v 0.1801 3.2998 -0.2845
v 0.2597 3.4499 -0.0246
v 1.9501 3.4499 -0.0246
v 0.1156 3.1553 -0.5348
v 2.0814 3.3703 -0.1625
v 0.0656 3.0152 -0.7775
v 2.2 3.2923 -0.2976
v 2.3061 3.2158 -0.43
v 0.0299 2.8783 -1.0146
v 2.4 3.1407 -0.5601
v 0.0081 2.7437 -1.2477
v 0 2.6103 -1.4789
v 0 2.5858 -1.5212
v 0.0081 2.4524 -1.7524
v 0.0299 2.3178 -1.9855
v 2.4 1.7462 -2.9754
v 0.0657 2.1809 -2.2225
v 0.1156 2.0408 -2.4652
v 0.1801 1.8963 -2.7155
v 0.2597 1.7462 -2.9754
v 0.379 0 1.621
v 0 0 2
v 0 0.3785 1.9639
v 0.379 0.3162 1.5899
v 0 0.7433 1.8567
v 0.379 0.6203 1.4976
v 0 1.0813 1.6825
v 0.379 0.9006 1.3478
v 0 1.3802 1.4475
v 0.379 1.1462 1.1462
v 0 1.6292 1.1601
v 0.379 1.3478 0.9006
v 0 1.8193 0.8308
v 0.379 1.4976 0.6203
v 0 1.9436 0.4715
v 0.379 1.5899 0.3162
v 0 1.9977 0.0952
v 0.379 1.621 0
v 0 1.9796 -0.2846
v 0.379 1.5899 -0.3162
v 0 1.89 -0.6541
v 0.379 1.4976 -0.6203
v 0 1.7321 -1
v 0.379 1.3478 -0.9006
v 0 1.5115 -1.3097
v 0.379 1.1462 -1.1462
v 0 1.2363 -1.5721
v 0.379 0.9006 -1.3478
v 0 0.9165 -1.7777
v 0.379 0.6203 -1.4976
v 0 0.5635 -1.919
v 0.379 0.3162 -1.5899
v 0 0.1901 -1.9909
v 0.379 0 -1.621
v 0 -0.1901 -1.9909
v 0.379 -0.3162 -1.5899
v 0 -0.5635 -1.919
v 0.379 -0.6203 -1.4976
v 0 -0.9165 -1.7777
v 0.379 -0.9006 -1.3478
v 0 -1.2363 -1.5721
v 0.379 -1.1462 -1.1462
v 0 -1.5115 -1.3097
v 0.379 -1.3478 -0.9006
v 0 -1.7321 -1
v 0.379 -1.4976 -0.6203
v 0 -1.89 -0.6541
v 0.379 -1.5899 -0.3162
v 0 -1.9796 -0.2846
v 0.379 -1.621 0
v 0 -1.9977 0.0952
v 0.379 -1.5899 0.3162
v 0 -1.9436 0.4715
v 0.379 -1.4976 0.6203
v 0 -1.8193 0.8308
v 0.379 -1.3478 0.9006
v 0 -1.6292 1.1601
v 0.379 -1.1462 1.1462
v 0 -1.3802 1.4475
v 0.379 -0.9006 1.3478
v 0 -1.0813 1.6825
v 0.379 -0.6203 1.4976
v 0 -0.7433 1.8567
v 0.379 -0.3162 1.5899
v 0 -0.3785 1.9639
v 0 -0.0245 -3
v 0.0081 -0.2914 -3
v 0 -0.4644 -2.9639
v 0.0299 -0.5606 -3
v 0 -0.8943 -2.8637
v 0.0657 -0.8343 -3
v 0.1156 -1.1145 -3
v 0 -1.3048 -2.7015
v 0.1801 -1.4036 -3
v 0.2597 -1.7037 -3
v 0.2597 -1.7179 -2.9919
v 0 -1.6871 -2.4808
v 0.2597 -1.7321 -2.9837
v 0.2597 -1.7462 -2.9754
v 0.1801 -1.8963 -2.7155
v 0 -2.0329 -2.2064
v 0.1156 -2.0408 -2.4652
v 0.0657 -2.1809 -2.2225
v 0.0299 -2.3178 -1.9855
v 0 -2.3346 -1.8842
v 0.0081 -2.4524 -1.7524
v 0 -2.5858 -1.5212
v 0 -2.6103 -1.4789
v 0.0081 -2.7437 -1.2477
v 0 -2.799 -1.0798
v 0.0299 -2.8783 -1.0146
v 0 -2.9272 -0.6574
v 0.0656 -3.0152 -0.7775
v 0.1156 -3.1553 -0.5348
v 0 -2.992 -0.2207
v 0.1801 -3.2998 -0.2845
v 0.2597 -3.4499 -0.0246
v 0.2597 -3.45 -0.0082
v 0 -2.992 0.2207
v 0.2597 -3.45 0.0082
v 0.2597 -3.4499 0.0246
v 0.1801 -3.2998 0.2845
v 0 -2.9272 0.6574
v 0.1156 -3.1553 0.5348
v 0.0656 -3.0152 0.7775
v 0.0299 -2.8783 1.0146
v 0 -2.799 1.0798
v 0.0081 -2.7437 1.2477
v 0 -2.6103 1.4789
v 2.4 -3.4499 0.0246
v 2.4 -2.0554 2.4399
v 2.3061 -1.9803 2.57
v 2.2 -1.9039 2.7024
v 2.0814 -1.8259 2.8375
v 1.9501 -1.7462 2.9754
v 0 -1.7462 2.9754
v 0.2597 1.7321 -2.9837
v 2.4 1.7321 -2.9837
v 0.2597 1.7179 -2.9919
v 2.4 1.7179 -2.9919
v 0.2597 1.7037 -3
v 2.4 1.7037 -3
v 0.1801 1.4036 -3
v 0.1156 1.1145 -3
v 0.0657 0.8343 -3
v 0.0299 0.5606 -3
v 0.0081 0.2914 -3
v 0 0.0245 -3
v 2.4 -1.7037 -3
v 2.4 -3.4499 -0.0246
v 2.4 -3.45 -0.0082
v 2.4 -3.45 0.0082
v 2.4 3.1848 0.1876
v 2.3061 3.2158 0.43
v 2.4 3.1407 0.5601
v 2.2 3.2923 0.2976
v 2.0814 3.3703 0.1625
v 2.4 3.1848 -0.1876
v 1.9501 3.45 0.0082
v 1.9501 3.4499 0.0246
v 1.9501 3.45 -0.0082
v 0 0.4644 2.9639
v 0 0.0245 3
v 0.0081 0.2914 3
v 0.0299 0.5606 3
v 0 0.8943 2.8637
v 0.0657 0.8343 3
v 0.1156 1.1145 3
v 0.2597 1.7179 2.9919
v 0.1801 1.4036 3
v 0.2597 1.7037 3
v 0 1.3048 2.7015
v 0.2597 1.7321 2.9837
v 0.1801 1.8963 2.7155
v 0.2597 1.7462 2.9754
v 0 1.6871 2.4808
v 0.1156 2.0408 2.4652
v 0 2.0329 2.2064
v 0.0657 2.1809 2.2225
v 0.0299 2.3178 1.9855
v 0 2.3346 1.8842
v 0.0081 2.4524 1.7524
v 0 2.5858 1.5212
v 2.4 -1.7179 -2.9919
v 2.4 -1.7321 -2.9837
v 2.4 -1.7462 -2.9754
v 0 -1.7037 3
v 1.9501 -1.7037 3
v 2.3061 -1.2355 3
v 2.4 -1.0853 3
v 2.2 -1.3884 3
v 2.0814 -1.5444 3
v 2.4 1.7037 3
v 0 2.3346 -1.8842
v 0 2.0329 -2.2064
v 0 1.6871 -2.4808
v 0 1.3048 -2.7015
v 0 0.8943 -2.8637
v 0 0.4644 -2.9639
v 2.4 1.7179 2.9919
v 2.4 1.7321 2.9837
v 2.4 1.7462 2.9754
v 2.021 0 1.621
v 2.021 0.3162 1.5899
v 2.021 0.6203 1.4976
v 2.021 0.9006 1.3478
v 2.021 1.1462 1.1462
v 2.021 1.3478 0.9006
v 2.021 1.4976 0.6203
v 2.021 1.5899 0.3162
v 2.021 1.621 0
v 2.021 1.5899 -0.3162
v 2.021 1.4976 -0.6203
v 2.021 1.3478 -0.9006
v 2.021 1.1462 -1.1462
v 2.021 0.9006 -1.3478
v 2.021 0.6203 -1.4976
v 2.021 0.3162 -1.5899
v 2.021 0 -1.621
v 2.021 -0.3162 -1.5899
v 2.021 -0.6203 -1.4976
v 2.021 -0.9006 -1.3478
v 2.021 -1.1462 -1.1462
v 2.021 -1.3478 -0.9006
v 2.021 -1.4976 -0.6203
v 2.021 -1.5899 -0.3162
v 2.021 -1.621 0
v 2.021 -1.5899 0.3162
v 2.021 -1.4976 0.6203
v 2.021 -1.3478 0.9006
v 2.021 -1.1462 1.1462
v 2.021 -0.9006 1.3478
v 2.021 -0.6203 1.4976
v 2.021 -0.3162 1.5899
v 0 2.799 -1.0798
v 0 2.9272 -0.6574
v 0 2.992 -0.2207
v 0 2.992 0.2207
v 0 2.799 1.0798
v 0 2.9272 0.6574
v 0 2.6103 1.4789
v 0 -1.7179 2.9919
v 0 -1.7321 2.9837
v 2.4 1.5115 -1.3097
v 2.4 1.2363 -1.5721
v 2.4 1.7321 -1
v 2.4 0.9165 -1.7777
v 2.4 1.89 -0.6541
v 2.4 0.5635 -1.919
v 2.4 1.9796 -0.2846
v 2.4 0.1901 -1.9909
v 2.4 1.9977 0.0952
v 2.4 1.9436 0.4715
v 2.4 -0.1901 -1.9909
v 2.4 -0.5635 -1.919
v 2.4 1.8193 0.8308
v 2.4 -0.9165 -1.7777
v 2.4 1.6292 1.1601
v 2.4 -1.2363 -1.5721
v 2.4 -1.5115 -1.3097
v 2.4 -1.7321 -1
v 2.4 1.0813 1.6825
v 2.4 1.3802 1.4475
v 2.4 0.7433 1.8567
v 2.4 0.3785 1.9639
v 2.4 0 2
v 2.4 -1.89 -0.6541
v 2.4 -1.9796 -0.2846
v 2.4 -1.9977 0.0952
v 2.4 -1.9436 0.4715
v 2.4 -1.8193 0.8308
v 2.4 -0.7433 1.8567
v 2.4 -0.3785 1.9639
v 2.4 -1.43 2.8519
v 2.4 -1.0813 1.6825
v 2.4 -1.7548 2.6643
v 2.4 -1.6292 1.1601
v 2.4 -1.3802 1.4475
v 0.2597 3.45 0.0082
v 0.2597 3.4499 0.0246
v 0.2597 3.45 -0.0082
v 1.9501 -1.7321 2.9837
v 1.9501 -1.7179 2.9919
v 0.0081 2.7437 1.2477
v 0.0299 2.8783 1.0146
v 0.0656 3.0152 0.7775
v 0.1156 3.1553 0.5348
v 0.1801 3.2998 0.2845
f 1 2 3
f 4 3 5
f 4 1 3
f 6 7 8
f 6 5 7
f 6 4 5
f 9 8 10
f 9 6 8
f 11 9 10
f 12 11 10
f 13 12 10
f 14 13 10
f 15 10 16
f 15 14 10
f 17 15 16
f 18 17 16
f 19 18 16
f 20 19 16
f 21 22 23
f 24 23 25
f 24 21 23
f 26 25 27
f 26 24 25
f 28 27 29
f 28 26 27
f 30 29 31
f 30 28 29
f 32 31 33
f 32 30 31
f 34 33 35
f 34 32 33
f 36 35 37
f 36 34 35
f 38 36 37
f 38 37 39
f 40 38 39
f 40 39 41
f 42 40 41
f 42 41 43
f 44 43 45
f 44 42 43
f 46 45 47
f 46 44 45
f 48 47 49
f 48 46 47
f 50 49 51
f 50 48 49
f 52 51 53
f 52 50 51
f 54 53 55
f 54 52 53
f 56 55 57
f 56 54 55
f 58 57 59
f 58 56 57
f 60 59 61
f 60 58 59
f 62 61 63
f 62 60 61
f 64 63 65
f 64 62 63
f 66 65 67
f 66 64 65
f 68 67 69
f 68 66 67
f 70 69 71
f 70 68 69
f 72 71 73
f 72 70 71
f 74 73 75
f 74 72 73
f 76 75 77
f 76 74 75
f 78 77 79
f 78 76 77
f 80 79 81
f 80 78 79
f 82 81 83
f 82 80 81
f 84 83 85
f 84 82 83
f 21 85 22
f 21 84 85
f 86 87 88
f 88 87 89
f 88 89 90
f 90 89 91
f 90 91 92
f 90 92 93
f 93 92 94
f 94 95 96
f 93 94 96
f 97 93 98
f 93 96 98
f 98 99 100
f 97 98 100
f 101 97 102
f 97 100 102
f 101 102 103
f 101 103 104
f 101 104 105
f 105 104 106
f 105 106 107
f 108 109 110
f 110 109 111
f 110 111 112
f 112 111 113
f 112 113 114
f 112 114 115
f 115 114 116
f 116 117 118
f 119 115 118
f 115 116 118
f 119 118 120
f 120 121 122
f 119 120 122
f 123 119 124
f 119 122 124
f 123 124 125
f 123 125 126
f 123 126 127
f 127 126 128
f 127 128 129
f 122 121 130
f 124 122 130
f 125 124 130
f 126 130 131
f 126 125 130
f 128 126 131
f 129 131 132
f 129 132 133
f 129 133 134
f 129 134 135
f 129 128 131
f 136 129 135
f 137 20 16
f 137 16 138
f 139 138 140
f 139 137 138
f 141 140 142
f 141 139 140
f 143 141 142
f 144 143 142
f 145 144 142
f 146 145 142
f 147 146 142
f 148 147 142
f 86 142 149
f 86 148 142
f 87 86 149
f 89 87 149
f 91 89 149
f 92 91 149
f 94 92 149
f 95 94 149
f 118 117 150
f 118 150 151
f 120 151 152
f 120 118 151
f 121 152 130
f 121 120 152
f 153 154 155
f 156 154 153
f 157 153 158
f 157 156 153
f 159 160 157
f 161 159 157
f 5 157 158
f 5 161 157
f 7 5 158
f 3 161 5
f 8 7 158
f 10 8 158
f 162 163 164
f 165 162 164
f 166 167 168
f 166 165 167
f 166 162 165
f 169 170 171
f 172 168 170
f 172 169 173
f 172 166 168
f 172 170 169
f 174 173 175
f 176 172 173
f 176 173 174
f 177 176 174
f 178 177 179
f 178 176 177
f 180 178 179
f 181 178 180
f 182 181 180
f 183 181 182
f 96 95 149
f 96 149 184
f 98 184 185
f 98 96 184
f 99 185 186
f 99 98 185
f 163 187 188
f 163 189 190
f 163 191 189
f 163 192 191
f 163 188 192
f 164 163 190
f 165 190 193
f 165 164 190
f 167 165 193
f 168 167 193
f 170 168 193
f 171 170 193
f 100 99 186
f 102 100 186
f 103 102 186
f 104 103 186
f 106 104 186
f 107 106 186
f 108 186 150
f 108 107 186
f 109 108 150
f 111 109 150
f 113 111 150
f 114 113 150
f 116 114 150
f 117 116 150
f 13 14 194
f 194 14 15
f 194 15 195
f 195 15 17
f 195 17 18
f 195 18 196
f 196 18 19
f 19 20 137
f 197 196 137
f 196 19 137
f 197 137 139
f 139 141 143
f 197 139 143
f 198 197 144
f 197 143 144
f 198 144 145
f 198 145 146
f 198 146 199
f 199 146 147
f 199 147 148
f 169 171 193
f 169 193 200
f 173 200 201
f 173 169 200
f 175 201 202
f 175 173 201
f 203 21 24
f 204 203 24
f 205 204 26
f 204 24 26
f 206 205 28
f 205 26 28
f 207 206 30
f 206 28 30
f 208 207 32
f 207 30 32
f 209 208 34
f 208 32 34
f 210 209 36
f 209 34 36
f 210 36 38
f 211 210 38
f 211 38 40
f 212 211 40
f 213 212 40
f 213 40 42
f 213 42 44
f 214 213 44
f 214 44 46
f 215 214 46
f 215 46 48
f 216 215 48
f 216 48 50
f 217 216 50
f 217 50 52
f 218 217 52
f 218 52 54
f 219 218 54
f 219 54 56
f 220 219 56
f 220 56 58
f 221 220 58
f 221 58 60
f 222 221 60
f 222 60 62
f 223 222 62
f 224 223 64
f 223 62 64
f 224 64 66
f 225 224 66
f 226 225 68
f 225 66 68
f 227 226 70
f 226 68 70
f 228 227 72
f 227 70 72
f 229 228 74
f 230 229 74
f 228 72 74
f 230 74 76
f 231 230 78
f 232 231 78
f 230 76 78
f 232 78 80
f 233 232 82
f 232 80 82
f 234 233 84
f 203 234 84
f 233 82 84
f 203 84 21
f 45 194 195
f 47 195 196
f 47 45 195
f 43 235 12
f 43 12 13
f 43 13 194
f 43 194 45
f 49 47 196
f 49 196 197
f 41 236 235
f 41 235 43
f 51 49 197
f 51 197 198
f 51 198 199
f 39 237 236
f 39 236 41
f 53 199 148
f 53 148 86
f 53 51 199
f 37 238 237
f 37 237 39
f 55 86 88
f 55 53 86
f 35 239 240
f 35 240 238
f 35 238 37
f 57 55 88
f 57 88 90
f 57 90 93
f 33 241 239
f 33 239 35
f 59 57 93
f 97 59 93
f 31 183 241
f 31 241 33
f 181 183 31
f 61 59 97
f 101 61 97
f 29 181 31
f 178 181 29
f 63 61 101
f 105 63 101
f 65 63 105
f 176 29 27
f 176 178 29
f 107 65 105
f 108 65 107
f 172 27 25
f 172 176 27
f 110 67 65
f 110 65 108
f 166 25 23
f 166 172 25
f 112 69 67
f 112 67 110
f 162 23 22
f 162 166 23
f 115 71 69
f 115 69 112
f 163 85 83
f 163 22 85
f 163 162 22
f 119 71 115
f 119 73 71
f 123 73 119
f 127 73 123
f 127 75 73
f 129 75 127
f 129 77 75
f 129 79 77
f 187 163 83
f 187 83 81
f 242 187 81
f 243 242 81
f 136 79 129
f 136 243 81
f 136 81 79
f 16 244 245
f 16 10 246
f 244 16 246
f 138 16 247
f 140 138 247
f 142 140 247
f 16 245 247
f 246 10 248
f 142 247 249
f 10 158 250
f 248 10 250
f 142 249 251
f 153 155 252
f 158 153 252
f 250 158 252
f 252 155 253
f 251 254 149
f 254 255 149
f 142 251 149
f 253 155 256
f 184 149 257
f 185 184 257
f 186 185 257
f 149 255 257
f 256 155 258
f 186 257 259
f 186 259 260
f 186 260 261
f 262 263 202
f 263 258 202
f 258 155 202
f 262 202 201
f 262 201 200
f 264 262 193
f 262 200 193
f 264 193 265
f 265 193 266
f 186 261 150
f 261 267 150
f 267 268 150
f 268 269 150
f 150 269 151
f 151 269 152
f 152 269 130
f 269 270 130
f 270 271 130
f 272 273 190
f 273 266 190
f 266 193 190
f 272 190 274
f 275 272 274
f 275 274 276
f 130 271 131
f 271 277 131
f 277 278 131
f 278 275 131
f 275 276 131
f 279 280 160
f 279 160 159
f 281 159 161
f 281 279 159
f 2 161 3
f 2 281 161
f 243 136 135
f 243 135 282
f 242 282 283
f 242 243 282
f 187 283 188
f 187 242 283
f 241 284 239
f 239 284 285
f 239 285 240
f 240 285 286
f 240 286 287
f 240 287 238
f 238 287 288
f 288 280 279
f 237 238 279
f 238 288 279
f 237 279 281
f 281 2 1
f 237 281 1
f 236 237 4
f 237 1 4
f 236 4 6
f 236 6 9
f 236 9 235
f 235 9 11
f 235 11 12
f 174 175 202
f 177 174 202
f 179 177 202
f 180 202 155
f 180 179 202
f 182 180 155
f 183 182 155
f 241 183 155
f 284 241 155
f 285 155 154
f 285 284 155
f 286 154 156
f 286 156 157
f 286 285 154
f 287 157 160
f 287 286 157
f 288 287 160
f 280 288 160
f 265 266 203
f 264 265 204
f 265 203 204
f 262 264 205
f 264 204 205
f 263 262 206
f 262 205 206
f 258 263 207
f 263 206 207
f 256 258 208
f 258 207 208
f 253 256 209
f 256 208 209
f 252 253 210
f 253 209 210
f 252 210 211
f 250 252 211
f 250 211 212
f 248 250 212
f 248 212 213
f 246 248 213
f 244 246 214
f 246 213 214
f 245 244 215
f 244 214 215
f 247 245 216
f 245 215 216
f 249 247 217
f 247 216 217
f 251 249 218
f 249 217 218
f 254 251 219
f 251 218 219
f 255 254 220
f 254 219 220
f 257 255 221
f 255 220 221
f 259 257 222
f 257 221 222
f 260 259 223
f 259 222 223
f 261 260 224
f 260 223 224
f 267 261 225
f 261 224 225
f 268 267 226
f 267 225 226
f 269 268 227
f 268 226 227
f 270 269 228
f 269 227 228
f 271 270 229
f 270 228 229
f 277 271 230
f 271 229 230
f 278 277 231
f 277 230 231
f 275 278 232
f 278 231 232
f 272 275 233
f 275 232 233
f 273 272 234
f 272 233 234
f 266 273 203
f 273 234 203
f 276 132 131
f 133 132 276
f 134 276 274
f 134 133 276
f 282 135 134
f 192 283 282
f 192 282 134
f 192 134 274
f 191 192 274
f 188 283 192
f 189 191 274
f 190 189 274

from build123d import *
from OCP.BRepFilletAPI import BRepFilletAPI_MakeChamfer

# Parameters (mm, degrees)
EXTRUDE_1_DEPTH    = 2.4
HOLE_WIZARD_M3_1_D = 3.242
CHAMFER_1_SIZE     = 0.45
CHAMFER_1_SIZE_2   = 0.259807621
CHAMFER_3_SIZE     = 0.379


with BuildPart() as part:
    # 草圖1 → 填料-伸長1 (new body)
    with BuildSketch(Plane(origin=(0, 0, 0), x_dir=(0, -1, 0), z_dir=(-1, 0, 0))):
        with BuildLine():
            Line((-1.746239959, 2.975423668), (-3.449912463, 0.024576332))
            ThreePointArc((-3.449912463, 0.024576332), (-3.45, 0), (-3.449912463, -0.024576332))
            Line((-3.449912463, -0.024576332), (-1.746239959, -2.975423668))
            ThreePointArc((-1.746239959, -2.975423668), (-1.725, -2.987787643), (-1.703672504, -3))
            Line((-1.703672504, -3), (1.703672504, -3))
            ThreePointArc((1.703672504, -3), (1.725, -2.987787643), (1.746239959, -2.975423668))
            Line((1.746239959, -2.975423668), (3.449912463, -0.024576332))
            ThreePointArc((3.449912463, -0.024576332), (3.45, 0), (3.449912463, 0.024576332))
            Line((3.449912463, 0.024576332), (1.746239959, 2.975423668))
            ThreePointArc((1.746239959, 2.975423668), (1.725, 2.987787643), (1.703672504, 3))
            Line((1.703672504, 3), (-1.703672504, 3))
            ThreePointArc((-1.703672504, 3), (-1.725, 2.987787643), (-1.746239959, 2.975423668))
        make_face()
    extrude(amount=-EXTRUDE_1_DEPTH)

    # M3 餘隙孔1 (through all)
    with Locations(Plane(origin=(2.4, 0, 0), x_dir=(0, 0, -1), z_dir=(1, 0, 0))):
        with Locations((0, 0)):
            Hole(HOLE_WIZARD_M3_1_D / 2)

    # 導角1
    chamfer_1_edges_1 = [part.edges().sort_by_distance(p)[0] for p in [
        (0, -3.45, 0),
    ]]
    chamfer_1_side_1 = [part.faces().sort_by_distance(p)[0] for p in [
        (0, -3.444803848, 0),
    ]]
    chamfer_1_edges_2 = [part.edges().sort_by_distance(p)[0] for p in [
        (0, 1.725, 2.987787643),
    ]]
    chamfer_1_side_2 = [part.faces().sort_by_distance(p)[0] for p in [
        (0.005196152, 1.725, 2.987787643),
    ]]
    chamfer_1_edges_3 = [part.edges().sort_by_distance(p)[0] for p in [
        (0, 3.45, 0),
    ]]
    chamfer_1_side_3 = [part.faces().sort_by_distance(p)[0] for p in [
        (0, 3.444803848, 0),
    ]]
    chamfer_1_edges_4 = [part.edges().sort_by_distance(p)[0] for p in [
        (0, 1.725, -2.987787643),
    ]]
    chamfer_1_side_4 = [part.faces().sort_by_distance(p)[0] for p in [
        (0, 1.722401924, -2.983287643),
    ]]
    chamfer_1_edges_5 = [part.edges().sort_by_distance(p)[0] for p in [
        (0, -1.725, -2.987787643),
    ]]
    chamfer_1_side_5 = [part.faces().sort_by_distance(p)[0] for p in [
        (0, -1.722401924, -2.983287643),
    ]]
    chamfer_1_edges_6 = [part.edges().sort_by_distance(p)[0] for p in [
        (2.4, -1.725, 2.987787643),
    ]]
    chamfer_1_side_6 = [part.faces().sort_by_distance(p)[0] for p in [
        (2.4, -1.722401924, 2.983287643),
    ]]
    chamfer_1_edges_7 = [part.edges().sort_by_distance(p)[0] for p in [
        (2.4, 3.45, 0),
    ]]
    chamfer_1_side_7 = [part.faces().sort_by_distance(p)[0] for p in [
        (2.4, 3.444803848, 0),
    ]]
    chamfer_1 = BRepFilletAPI_MakeChamfer(part.part.solid().wrapped)
    for e in chamfer_1_edges_1:
        chamfer_1.Add(CHAMFER_1_SIZE - 0.0001, CHAMFER_1_SIZE_2 - 0.0001, e.wrapped, chamfer_1_side_1[0].wrapped)
    for e in chamfer_1_edges_2:
        chamfer_1.Add(CHAMFER_1_SIZE_2 - 0.0001, CHAMFER_1_SIZE - 0.0001, e.wrapped, chamfer_1_side_2[0].wrapped)
    for e in chamfer_1_edges_3:
        chamfer_1.Add(CHAMFER_1_SIZE - 0.0001, CHAMFER_1_SIZE_2 - 0.0001, e.wrapped, chamfer_1_side_3[0].wrapped)
    for e in chamfer_1_edges_4:
        chamfer_1.Add(CHAMFER_1_SIZE - 0.0001, CHAMFER_1_SIZE_2 - 0.0001, e.wrapped, chamfer_1_side_4[0].wrapped)
    for e in chamfer_1_edges_5:
        chamfer_1.Add(CHAMFER_1_SIZE - 0.0001, CHAMFER_1_SIZE_2 - 0.0001, e.wrapped, chamfer_1_side_5[0].wrapped)
    for e in chamfer_1_edges_6:
        chamfer_1.Add(CHAMFER_1_SIZE_2 - 0.0001, CHAMFER_1_SIZE - 0.0001, e.wrapped, chamfer_1_side_6[0].wrapped)
    for e in chamfer_1_edges_7:
        chamfer_1.Add(CHAMFER_1_SIZE_2 - 0.0001, CHAMFER_1_SIZE - 0.0001, e.wrapped, chamfer_1_side_7[0].wrapped)
    add(Compound.cast(chamfer_1.Shape()), mode=Mode.REPLACE)  # a hair under: the kernel refuses the full size

    # 導角3
    chamfer_3_edges = [part.edges().sort_by_distance(p)[0] for p in [
        (2.4, 0, -1.621),
        (0, 0, -1.621),
    ]]
    chamfer(chamfer_3_edges, length=CHAMFER_3_SIZE)


solid = part.part
